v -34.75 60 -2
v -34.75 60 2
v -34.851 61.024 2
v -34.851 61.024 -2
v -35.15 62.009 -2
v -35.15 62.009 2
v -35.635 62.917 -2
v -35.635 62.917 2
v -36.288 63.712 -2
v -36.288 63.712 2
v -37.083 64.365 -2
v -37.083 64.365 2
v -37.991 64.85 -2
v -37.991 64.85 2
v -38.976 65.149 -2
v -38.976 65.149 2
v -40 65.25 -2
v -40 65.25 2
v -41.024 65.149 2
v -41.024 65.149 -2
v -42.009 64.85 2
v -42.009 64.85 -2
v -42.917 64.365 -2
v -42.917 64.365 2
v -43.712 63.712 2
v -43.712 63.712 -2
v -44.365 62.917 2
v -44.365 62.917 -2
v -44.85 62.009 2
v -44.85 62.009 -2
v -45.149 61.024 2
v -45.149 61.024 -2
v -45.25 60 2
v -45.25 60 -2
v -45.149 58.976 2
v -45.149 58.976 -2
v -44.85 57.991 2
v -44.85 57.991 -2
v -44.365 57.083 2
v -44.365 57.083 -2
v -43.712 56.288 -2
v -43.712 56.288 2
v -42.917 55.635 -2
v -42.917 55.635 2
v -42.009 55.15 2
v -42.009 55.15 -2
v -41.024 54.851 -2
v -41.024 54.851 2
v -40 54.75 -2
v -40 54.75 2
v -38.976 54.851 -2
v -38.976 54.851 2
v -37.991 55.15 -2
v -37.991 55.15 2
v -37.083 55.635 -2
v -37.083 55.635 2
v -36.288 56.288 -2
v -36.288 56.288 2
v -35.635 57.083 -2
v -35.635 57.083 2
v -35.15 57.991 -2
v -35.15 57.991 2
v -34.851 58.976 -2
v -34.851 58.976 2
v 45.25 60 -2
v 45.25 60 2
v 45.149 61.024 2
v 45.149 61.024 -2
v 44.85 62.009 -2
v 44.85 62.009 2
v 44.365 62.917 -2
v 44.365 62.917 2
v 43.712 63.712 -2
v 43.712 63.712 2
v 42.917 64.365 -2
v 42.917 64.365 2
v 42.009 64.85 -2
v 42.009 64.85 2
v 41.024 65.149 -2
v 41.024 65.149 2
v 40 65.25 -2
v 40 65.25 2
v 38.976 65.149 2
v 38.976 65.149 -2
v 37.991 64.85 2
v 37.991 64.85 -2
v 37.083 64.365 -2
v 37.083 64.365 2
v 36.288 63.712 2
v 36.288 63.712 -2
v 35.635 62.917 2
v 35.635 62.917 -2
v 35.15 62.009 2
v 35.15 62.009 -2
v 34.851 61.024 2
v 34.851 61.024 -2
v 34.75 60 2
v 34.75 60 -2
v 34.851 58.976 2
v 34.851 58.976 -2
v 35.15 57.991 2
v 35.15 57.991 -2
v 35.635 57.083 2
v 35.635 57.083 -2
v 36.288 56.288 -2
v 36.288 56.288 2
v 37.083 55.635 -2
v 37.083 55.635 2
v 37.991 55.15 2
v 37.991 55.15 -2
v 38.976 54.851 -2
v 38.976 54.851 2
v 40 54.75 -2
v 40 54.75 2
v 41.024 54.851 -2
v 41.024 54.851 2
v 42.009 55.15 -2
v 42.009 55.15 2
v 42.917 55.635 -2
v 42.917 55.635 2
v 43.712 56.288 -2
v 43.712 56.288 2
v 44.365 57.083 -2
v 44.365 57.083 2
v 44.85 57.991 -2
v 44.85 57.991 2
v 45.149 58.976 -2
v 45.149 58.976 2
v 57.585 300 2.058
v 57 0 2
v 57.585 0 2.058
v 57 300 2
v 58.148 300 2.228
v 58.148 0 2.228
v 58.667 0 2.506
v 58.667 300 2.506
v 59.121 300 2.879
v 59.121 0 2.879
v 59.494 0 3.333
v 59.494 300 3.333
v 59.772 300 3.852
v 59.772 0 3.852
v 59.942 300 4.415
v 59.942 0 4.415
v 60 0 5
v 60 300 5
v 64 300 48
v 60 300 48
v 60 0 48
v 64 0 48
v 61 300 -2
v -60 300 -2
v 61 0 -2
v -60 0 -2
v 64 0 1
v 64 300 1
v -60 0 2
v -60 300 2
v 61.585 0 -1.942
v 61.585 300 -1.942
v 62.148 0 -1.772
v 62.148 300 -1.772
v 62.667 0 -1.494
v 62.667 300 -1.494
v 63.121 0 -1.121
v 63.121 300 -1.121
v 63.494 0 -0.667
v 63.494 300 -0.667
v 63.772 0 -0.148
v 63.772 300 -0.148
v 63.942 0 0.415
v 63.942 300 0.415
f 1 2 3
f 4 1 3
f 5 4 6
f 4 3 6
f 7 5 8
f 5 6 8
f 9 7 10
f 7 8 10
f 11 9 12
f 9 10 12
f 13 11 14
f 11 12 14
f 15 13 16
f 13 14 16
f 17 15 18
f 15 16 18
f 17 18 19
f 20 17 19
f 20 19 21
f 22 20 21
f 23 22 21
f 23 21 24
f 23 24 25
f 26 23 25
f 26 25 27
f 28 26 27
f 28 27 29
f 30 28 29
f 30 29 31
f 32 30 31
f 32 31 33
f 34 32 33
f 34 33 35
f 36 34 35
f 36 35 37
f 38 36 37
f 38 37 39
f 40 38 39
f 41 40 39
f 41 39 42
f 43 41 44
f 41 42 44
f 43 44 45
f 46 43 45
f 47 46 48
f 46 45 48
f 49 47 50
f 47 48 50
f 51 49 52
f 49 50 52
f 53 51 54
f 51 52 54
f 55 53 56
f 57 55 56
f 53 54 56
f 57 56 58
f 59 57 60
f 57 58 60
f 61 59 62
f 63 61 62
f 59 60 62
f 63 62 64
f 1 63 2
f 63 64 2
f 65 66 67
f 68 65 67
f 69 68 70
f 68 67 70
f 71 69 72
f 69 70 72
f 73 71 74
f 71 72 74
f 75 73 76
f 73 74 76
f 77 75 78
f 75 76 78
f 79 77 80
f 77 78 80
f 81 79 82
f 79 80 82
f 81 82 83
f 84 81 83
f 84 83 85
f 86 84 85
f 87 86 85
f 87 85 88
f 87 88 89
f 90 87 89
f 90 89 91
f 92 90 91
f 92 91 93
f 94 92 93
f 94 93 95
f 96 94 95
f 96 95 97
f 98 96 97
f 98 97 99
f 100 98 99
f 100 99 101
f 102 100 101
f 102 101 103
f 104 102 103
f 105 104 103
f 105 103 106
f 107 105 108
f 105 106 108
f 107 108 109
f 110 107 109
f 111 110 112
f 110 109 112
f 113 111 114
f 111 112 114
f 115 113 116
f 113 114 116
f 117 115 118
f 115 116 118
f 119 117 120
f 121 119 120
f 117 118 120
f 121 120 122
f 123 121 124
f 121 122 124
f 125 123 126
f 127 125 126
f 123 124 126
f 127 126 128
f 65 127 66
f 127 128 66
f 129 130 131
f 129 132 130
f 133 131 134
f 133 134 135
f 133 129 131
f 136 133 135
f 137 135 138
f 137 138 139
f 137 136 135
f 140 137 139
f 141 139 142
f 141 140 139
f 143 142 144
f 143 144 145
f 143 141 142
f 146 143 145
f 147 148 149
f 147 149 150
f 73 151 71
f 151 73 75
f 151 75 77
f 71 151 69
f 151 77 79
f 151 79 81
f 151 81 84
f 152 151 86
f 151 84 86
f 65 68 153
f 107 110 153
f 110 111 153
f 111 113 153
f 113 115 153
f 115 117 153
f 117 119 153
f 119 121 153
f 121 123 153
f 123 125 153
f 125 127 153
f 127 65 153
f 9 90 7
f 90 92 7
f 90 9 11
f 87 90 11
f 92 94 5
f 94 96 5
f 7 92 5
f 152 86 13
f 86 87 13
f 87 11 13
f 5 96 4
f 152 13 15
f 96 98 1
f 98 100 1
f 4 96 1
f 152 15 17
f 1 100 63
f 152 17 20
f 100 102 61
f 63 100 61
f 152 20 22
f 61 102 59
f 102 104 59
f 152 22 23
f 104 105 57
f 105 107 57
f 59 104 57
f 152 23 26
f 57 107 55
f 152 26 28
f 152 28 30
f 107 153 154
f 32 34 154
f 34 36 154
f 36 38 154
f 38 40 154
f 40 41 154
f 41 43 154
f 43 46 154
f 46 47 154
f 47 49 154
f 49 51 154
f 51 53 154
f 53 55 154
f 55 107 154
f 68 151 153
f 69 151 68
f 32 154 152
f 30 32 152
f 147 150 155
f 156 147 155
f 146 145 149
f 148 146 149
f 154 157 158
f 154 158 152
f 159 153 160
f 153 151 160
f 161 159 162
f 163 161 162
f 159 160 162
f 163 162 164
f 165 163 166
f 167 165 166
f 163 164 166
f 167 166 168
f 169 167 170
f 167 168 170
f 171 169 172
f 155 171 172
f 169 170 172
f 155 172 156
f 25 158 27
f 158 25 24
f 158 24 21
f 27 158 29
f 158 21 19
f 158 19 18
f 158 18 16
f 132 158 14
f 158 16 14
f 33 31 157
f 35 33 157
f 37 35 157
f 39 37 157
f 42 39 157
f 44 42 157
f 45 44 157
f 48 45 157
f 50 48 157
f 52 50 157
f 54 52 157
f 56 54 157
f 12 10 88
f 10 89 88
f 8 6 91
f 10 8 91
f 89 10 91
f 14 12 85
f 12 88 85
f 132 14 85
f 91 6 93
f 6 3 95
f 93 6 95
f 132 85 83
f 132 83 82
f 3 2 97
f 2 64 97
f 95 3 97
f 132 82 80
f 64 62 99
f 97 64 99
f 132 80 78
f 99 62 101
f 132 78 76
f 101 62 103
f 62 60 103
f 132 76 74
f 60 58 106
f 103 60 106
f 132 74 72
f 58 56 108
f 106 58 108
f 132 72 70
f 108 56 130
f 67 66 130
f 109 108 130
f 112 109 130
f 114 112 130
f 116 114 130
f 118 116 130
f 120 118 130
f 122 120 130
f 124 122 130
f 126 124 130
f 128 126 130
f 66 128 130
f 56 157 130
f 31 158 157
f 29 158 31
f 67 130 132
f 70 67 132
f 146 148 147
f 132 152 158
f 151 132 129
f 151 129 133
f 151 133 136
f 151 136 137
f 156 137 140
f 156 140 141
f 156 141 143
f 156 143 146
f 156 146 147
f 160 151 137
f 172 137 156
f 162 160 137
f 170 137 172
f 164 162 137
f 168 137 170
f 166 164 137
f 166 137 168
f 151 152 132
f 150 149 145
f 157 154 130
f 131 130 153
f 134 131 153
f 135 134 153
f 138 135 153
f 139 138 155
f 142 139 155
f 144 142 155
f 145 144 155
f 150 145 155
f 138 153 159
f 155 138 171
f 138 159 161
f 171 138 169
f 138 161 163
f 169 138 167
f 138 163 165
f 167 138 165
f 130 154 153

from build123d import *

# Parameters (mm, degrees)
SKETCH1_W        = 120
SKETCH1_H        = 4
EXTRUDE_2_DEPTH  = 300
FILLET_2_R       = 3
HOLES_LEFT_REACH = 6
SKETCH3_R        = 5.25


with BuildPart() as part:
    # Sketch1 → Extrude 2 (new body)
    with BuildSketch(Plane(origin=(0, 0, 0), x_dir=(1, 0, 0), z_dir=(0, 1, 0))):
        Polygon((64, 2), (60, 2), (60, -2), (60, -48), (64, -48), align=None)
        Rectangle(SKETCH1_W, SKETCH1_H)
    extrude(amount=EXTRUDE_2_DEPTH)

    # Fillet 2
    fillet_2_edges = [part.edges().sort_by_distance(p)[0] for p in [
        (64, 150, -2),
        (60, 150, 2),
    ]]
    fillet(fillet_2_edges, radius=FILLET_2_R)

    # Sketch3 → Holes left (cut, up to next)
    with BuildSketch(Plane.XY.offset(2), mode=Mode.PRIVATE) as holes_left_sk1:
        with Locations((-40, 60)):
            Circle(SKETCH3_R)
    holes_left_tool1 = extrude(holes_left_sk1.sketch, amount=-HOLES_LEFT_REACH, mode=Mode.PRIVATE) & part.part
    add(holes_left_tool1.solids().sort_by_distance((-40, 60, 2))[0], mode=Mode.SUBTRACT)
    # Sketch3 → Holes left (cut, up to next)
    with BuildSketch(Plane.XY.offset(2), mode=Mode.PRIVATE) as holes_left_sk2:
        with Locations((40, 60)):
            Circle(SKETCH3_R)
    holes_left_tool2 = extrude(holes_left_sk2.sketch, amount=-HOLES_LEFT_REACH, mode=Mode.PRIVATE) & part.part
    add(holes_left_tool2.solids().sort_by_distance((40, 60, 2))[0], mode=Mode.SUBTRACT)


solid = part.part
